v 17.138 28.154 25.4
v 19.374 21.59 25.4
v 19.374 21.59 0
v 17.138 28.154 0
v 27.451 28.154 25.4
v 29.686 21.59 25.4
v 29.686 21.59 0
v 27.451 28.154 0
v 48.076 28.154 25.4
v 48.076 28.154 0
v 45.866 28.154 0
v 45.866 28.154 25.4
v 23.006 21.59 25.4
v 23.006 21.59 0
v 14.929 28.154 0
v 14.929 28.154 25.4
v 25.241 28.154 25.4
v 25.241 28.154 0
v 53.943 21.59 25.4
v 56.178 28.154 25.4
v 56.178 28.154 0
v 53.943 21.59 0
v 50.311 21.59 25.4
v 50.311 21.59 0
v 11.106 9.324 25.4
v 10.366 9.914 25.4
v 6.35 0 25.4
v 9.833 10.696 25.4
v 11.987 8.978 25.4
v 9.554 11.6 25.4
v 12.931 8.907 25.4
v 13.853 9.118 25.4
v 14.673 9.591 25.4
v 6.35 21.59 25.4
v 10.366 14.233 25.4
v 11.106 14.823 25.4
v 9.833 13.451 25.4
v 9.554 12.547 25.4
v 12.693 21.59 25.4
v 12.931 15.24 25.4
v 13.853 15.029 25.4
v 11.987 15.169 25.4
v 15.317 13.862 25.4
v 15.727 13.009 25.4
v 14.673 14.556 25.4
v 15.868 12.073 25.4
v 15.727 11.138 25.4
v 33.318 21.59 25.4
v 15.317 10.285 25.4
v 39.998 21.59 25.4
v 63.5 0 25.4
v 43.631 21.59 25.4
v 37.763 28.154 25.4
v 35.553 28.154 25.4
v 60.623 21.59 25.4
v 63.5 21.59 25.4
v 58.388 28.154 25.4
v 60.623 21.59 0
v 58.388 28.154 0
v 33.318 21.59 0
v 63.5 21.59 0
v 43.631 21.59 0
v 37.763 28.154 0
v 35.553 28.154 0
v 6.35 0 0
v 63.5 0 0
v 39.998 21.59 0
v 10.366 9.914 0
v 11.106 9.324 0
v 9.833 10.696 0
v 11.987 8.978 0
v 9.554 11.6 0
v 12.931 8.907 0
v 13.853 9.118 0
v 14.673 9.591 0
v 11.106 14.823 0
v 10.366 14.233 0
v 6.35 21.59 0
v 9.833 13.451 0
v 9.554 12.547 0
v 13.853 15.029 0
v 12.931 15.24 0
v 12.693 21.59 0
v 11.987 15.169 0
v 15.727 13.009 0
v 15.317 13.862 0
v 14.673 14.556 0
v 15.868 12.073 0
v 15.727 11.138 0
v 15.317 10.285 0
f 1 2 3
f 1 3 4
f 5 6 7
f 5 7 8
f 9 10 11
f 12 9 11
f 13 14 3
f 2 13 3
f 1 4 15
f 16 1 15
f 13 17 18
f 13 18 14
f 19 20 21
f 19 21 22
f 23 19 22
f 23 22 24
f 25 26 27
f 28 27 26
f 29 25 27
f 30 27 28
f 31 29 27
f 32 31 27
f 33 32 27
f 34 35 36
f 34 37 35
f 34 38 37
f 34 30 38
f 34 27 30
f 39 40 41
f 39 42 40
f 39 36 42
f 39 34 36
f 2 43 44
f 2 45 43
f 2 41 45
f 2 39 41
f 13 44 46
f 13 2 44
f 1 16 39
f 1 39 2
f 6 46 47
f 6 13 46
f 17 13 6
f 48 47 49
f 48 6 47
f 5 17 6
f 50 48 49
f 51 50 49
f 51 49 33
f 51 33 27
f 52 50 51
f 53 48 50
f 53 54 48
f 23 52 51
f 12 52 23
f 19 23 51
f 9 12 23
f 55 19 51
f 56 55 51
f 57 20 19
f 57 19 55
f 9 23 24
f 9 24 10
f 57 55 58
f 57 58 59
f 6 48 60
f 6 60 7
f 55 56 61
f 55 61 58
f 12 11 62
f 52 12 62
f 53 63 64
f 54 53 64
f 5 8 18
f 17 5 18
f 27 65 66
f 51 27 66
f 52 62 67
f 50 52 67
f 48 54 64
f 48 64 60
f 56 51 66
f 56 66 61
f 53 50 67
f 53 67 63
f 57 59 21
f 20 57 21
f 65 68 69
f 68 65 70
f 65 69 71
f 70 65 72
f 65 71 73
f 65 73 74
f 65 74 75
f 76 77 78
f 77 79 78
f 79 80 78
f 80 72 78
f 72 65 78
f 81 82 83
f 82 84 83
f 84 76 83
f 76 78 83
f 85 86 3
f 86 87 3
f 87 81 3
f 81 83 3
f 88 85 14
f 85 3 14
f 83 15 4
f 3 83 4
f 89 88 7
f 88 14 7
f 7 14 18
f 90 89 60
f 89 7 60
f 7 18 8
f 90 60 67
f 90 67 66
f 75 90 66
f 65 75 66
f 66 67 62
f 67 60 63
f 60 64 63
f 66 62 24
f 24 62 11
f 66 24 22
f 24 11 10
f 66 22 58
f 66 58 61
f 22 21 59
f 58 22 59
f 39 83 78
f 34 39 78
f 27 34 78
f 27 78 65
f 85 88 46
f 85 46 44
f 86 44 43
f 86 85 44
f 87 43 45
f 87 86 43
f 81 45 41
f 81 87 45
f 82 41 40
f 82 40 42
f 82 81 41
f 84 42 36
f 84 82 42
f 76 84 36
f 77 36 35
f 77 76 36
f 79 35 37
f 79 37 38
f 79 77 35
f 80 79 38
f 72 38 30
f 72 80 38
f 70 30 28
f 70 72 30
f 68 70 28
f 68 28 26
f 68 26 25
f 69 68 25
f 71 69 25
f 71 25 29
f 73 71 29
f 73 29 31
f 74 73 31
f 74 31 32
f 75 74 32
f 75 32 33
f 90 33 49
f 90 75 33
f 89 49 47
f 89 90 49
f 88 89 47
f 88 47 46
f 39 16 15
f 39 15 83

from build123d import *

# Parameters (mm, degrees)
SKETCH1_R        = 3.175
EXTRUSION1_DEPTH = 25.4


with BuildPart() as part:
    # Sketch1 → Extrusion1 (new body)
    with BuildSketch(Plane.XY):
        Polygon((6.35, 0), (63.5, 0), (63.5, 21.59), (59.69, 21.59), (6.35, 21.59), align=None)
        with Locations((12.693410129, 12.073465073)):
            Circle(SKETCH1_R, mode=Mode.SUBTRACT)
        Polygon((14.928610129, 28.154355163), (12.693410129, 21.59), (16.503410129, 21.59), (19.373610129, 21.59), (17.138410129, 28.154355163), (16.033510129, 28.154355163), align=None)
        Polygon((25.241010129, 28.154355163), (23.005810129, 21.59), (29.686010129, 21.59), (27.450810129, 28.154355163), (26.345910129, 28.154355163), align=None)
        Polygon((59.69, 21.59), (60.623210129, 21.59), (58.388010129, 28.154355163), (57.283110129, 28.154355163), (56.178210129, 28.154355163), (53.943010129, 21.59), align=None)
        Polygon((43.630610129, 21.59), (50.310810129, 21.59), (48.075610129, 28.154355163), (46.970710129, 28.154355163), (45.865810129, 28.154355163), align=None)
        Polygon((39.996666979, 21.59), (39.998410129, 21.59), (37.763210129, 28.154355163), (36.658310129, 28.154355163), (35.553410129, 28.154355163), (33.318210129, 21.59), (36.186666979, 21.59), align=None)
    extrude(amount=EXTRUSION1_DEPTH)


solid = part.part
